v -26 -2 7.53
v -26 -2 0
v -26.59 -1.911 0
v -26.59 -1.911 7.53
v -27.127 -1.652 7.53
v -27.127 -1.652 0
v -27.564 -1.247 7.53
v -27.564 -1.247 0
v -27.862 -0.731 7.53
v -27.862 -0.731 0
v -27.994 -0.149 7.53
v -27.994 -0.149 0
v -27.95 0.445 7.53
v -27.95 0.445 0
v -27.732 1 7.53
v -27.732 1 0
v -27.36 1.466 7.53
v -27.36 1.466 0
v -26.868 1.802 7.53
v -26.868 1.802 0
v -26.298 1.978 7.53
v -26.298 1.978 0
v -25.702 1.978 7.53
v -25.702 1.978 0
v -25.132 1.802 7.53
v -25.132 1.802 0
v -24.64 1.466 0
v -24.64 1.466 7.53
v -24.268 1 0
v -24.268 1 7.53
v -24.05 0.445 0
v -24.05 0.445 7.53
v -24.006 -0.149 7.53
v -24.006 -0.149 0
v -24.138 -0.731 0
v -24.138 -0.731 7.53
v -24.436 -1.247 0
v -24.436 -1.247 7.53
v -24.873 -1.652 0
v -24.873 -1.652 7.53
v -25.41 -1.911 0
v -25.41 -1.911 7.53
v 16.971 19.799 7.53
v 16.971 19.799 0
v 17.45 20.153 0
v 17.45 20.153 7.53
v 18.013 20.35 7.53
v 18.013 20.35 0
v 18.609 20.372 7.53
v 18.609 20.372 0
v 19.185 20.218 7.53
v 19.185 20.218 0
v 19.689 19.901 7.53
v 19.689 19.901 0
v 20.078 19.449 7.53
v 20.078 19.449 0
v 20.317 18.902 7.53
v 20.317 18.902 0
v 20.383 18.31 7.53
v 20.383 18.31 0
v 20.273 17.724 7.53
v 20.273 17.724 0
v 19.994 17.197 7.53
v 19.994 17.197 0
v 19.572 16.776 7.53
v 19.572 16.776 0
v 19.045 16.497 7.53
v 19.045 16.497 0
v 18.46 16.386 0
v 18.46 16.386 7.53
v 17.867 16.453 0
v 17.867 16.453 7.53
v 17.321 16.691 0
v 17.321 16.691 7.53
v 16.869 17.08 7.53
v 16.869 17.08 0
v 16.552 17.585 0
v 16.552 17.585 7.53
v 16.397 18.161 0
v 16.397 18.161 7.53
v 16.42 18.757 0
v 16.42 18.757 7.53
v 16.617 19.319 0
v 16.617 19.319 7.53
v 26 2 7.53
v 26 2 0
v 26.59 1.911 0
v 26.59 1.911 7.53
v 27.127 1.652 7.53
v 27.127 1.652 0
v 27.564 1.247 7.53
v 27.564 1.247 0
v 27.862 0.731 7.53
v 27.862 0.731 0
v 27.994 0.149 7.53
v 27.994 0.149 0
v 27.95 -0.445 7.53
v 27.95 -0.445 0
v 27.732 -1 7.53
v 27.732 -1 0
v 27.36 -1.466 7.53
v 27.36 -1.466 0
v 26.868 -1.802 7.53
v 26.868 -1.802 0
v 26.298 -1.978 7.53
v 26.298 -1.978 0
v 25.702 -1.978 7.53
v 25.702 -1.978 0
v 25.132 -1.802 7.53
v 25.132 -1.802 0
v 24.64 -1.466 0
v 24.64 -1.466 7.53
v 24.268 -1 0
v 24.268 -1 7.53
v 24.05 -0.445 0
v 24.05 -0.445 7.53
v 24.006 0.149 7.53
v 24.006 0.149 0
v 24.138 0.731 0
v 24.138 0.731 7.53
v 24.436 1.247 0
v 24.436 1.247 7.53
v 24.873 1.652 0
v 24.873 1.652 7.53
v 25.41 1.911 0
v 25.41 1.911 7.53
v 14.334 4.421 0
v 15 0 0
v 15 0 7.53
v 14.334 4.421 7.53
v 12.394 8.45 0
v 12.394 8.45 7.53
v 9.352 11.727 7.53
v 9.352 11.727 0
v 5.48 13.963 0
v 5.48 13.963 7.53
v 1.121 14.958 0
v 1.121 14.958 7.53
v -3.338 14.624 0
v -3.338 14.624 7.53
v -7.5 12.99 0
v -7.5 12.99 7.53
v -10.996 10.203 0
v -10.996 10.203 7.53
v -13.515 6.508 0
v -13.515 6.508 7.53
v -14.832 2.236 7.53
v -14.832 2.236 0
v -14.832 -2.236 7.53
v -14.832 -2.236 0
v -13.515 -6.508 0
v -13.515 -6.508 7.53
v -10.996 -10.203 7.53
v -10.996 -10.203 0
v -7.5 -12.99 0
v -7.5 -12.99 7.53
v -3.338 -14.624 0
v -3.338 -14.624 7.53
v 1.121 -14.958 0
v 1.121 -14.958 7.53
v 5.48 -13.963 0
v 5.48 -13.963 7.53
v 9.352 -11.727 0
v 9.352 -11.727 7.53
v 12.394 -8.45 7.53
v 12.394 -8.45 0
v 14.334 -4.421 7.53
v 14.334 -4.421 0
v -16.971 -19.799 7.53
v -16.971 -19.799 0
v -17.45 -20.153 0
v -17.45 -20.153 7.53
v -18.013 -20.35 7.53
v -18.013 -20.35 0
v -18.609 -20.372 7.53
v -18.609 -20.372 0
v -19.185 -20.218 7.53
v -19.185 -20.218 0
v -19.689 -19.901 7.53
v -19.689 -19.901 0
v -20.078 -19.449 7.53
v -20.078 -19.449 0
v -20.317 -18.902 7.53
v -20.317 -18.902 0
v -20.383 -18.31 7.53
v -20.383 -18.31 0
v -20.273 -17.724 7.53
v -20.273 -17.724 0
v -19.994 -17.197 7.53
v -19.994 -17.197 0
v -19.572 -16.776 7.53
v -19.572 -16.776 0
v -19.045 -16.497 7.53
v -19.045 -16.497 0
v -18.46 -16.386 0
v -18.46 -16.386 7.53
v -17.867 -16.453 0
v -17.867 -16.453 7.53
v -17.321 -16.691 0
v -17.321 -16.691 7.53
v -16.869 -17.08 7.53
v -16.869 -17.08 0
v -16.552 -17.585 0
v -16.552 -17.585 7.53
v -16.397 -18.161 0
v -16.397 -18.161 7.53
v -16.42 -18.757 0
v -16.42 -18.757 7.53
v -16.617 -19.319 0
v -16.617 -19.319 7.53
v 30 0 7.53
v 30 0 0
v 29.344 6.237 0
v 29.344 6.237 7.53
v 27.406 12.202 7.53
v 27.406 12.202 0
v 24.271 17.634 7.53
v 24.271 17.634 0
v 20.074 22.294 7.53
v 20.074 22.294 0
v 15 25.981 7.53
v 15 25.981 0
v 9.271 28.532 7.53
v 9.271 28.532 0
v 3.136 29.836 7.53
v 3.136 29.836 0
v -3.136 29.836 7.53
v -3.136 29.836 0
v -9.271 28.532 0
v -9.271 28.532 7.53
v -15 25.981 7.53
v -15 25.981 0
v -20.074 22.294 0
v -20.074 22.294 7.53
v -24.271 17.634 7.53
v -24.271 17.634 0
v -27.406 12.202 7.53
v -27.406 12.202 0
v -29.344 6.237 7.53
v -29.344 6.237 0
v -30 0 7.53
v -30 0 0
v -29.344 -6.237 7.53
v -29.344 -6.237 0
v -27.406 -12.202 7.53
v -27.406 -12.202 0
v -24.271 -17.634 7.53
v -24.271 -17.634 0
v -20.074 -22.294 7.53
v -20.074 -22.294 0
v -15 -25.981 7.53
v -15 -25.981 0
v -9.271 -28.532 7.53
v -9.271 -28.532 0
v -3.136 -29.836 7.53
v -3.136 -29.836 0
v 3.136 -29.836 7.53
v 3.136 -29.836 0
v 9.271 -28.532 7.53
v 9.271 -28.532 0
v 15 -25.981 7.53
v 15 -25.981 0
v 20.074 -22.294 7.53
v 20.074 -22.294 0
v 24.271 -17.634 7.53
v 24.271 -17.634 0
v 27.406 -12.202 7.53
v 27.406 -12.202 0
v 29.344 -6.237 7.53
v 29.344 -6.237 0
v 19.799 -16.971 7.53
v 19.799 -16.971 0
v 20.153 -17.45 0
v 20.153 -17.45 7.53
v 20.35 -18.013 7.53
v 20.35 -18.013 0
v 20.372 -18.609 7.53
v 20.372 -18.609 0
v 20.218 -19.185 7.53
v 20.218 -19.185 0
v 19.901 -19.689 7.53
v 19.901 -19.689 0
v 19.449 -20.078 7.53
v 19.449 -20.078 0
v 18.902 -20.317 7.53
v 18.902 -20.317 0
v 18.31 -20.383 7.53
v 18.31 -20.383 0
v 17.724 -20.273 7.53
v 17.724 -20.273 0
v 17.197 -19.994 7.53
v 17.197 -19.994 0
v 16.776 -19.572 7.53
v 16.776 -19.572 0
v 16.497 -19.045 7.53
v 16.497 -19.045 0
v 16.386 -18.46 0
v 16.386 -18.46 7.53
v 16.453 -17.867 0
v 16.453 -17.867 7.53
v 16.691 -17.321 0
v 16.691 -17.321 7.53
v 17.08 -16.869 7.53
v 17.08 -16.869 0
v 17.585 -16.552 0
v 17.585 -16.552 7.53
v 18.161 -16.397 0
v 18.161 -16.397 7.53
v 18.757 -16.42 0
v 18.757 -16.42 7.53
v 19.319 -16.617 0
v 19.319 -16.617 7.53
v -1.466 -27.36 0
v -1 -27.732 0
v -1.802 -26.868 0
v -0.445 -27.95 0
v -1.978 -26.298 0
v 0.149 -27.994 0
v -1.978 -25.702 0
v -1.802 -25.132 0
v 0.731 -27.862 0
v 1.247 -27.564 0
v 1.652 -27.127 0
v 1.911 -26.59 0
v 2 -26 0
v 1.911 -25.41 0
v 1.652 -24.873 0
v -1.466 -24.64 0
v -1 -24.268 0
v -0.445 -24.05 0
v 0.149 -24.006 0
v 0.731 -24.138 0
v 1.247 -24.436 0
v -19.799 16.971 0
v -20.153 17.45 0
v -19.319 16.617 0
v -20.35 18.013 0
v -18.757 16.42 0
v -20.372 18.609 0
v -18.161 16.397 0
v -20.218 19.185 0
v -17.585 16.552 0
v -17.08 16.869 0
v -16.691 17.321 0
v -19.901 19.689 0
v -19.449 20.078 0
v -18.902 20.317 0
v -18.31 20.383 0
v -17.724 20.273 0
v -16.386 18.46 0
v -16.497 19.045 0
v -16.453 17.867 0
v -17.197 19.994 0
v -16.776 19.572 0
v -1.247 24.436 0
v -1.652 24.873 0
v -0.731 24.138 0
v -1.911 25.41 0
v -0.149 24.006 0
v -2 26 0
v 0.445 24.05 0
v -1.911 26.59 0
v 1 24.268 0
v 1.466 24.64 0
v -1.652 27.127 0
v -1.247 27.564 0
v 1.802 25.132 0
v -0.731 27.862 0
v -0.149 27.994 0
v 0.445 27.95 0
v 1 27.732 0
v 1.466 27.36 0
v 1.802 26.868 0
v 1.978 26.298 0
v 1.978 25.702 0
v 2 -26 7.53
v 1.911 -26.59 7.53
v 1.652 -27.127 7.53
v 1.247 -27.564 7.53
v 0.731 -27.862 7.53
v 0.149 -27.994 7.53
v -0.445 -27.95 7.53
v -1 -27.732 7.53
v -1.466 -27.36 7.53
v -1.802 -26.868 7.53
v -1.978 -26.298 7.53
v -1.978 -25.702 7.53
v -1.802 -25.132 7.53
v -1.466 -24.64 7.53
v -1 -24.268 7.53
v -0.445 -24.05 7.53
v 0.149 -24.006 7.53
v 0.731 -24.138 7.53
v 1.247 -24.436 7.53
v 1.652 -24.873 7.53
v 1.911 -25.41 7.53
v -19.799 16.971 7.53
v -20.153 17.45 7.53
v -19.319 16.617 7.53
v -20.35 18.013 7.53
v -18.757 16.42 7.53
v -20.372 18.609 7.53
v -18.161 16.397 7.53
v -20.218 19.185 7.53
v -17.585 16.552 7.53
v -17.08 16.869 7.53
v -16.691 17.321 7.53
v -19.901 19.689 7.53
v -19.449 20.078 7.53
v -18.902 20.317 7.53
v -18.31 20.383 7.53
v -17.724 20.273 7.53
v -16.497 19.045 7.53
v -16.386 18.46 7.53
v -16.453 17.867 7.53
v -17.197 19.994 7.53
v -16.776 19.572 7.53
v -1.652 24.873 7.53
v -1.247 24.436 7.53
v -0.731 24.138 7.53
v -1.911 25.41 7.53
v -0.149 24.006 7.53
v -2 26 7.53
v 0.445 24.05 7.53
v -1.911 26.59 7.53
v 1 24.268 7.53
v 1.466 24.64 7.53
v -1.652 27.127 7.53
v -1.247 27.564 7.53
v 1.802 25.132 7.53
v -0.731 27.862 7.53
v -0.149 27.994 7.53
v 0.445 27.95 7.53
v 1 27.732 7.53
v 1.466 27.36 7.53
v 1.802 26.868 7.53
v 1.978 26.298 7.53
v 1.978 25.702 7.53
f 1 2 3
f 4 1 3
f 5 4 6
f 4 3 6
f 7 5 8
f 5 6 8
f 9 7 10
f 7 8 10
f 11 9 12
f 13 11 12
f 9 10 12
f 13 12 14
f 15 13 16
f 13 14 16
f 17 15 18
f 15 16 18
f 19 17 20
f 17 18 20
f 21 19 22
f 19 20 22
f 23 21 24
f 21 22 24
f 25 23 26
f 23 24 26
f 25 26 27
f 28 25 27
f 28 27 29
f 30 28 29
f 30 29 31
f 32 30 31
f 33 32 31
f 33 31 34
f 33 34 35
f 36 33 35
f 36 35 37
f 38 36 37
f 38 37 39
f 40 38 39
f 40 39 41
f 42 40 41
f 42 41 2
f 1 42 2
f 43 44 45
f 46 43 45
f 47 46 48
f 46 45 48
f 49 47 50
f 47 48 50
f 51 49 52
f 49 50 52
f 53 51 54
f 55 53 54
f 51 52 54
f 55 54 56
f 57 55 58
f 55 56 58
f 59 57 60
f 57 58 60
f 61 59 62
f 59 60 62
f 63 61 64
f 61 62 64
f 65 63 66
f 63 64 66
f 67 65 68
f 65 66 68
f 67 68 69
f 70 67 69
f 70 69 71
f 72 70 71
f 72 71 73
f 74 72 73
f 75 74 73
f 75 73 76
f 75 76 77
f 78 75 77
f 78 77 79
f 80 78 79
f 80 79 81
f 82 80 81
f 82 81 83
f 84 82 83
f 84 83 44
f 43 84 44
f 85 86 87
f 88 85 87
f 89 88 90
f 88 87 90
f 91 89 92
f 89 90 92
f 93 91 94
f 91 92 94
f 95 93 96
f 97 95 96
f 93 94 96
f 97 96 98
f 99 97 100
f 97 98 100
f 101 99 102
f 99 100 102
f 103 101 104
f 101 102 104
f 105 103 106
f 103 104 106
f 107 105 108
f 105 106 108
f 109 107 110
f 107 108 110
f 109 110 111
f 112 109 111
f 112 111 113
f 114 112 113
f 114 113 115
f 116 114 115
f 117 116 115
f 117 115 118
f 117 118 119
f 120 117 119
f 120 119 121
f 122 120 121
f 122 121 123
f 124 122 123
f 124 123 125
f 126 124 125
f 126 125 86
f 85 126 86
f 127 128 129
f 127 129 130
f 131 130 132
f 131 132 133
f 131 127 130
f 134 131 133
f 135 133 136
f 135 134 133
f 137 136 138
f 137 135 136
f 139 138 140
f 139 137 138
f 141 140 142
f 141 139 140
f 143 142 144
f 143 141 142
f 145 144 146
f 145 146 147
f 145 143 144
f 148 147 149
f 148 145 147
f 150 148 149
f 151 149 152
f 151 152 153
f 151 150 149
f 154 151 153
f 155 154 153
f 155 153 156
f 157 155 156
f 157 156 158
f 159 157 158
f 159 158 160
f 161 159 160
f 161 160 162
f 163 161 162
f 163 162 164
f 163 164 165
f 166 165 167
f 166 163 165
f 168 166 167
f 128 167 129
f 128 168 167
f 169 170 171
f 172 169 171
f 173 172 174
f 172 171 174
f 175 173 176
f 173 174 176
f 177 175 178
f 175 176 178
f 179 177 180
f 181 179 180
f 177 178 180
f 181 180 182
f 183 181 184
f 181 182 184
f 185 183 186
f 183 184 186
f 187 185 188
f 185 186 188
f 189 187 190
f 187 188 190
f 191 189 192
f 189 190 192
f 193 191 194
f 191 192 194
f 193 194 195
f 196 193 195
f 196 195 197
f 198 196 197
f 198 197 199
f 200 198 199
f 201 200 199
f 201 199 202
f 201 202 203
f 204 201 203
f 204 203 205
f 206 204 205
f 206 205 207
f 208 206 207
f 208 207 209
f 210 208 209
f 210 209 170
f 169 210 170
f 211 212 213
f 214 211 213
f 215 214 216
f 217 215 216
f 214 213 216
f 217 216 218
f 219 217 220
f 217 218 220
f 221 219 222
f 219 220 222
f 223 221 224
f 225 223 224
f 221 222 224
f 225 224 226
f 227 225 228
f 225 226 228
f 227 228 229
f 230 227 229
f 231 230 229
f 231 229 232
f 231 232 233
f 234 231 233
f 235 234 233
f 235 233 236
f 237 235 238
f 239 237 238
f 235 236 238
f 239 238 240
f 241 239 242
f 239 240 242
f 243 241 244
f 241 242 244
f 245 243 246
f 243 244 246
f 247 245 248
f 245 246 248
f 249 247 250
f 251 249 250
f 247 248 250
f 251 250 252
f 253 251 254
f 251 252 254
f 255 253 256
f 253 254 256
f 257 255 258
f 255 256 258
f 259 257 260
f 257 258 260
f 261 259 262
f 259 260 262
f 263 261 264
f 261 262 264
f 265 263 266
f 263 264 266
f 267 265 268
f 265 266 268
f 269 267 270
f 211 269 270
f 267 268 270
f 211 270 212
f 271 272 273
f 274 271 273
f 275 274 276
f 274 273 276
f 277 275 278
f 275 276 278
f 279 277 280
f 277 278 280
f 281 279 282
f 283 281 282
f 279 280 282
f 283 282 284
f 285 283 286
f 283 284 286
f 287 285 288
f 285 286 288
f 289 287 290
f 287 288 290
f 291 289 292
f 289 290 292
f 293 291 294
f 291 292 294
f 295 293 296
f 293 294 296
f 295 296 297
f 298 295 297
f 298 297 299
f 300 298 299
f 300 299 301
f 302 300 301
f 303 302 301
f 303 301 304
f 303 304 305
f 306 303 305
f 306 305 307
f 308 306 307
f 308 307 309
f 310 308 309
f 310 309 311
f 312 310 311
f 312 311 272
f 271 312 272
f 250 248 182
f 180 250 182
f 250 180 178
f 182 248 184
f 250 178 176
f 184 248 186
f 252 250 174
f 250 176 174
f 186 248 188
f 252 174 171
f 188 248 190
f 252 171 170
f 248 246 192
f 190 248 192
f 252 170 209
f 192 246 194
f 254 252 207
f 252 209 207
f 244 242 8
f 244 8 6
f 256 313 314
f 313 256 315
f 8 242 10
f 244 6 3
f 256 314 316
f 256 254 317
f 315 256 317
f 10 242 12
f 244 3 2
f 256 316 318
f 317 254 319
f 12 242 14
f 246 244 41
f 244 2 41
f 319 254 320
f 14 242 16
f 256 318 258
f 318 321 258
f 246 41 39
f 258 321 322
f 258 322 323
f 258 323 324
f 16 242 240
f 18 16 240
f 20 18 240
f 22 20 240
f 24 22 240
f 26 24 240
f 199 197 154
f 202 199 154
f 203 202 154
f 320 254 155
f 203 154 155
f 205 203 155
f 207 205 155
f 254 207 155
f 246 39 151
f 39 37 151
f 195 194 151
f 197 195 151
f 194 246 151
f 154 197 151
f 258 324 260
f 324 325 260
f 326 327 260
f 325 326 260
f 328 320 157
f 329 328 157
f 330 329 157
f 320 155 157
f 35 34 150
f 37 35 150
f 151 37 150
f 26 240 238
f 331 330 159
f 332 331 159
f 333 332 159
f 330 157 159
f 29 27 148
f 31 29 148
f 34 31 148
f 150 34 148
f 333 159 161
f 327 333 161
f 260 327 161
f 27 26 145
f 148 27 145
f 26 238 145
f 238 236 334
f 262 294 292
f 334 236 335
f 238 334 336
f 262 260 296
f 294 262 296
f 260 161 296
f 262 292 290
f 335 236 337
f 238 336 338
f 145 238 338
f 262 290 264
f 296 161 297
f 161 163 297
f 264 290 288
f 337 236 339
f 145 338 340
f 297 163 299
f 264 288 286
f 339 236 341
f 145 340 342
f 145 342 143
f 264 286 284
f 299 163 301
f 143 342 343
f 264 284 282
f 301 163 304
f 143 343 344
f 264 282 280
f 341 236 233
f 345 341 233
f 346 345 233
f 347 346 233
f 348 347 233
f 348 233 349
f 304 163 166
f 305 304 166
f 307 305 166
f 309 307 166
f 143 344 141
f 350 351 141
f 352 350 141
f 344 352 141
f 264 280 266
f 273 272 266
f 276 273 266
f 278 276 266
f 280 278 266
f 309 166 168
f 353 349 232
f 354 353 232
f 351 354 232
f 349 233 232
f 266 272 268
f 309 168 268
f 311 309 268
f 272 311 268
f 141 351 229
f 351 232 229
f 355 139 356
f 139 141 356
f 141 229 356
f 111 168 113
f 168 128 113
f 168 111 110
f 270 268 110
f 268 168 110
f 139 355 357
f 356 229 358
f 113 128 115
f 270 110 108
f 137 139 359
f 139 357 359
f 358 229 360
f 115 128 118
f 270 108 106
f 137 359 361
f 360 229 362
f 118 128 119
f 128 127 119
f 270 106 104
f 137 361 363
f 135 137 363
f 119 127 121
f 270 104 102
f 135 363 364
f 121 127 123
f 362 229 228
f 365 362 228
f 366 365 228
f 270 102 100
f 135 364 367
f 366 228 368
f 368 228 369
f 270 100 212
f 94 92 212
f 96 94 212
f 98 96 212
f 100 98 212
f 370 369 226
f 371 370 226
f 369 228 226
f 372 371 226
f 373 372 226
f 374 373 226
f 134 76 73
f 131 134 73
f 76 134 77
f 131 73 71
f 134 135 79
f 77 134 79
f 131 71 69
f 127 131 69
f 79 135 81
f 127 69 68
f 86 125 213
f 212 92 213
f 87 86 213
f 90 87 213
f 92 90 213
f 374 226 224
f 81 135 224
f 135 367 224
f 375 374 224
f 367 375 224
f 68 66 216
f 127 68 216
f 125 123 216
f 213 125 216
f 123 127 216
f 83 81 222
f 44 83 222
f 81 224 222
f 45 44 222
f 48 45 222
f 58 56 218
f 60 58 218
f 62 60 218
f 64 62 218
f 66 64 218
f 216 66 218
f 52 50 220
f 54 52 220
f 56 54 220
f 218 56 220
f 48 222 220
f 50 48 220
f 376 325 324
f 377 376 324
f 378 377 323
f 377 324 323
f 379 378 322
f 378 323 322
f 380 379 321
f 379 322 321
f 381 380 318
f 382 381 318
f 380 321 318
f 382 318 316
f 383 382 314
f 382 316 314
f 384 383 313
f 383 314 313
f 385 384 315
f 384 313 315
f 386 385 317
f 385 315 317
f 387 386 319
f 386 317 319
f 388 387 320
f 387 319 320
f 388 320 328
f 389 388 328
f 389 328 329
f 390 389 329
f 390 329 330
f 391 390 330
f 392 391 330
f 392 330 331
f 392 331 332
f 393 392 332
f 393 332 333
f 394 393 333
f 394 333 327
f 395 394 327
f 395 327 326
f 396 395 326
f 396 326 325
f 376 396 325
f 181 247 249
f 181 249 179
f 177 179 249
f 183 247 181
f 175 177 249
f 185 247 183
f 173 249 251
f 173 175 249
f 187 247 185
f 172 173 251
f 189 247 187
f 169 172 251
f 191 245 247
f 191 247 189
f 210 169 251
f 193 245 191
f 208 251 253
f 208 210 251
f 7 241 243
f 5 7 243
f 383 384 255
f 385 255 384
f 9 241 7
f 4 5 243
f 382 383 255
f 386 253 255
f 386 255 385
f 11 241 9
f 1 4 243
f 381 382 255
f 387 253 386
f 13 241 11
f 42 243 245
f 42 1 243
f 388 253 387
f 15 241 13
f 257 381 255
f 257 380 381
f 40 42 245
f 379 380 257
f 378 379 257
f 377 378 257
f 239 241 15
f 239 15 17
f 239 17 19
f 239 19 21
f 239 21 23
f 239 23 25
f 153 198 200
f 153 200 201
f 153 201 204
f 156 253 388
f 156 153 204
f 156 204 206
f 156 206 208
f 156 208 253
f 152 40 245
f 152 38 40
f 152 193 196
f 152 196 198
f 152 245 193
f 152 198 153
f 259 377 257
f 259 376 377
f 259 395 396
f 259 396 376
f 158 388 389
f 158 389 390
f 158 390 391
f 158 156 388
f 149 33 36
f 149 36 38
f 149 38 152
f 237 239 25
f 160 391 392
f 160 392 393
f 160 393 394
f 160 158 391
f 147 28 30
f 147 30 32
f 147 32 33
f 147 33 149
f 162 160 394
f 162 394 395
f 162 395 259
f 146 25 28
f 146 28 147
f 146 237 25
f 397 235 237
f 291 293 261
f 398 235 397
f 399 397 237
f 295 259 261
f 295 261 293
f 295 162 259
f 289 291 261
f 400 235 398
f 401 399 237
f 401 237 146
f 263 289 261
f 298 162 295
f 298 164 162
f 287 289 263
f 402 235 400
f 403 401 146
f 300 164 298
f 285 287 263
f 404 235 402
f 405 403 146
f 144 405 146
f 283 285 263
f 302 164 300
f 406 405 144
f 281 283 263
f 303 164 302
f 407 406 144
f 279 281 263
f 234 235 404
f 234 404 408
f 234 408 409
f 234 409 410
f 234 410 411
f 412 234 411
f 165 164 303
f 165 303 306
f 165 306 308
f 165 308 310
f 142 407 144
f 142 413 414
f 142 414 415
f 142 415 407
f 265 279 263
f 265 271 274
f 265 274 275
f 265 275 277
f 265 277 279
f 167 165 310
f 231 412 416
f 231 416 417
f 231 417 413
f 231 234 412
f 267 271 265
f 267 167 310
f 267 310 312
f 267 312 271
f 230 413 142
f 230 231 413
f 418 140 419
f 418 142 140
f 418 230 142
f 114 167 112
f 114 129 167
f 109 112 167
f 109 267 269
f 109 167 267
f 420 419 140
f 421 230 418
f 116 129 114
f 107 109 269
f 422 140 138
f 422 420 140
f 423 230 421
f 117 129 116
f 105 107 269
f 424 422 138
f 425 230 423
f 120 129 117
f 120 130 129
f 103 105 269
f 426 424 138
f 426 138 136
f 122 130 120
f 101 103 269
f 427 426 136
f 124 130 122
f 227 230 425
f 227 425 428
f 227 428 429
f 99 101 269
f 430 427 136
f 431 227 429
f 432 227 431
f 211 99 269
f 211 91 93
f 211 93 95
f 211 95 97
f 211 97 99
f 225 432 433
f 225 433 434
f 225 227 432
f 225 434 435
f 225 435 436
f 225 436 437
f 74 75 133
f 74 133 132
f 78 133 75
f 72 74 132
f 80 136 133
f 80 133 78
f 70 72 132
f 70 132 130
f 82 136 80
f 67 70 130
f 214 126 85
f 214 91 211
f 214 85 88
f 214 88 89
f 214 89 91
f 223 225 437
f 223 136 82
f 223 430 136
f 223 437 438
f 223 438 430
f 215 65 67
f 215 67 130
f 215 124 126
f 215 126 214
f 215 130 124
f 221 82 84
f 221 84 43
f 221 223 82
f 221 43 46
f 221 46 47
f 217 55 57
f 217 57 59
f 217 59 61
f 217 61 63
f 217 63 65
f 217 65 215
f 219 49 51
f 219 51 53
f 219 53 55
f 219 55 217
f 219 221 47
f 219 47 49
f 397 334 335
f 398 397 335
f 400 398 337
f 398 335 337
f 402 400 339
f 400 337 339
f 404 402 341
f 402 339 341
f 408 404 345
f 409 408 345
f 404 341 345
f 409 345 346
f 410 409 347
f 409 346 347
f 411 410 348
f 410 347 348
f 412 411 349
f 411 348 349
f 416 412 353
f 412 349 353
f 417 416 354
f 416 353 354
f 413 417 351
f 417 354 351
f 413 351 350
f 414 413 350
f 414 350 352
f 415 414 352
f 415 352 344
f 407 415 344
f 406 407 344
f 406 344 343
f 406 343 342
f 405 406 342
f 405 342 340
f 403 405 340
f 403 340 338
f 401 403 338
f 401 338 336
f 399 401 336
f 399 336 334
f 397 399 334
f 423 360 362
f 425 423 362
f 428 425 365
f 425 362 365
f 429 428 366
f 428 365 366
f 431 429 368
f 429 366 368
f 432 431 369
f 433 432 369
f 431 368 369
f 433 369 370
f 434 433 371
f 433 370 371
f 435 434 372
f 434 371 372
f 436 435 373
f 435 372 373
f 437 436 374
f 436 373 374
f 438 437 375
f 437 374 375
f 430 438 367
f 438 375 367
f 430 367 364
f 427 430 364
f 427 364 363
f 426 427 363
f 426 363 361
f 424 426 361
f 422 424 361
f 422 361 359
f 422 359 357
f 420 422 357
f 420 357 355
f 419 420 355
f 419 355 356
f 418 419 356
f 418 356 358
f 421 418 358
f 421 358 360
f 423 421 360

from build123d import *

# Parameters (mm, degrees)
SKETCH1_R             = 30
SKETCH1_R_2           = 15
BOSS_EXTRUDE1_DEPTH   = 7.53
F_1_0MM_DOWEL_HOLE1_D = 4
CIRPATTERN1_COUNT     = 8


with BuildPart() as part:
    # Sketch1 → Boss-Extrude1 (new body)
    with BuildSketch(Plane.XY):
        Circle(SKETCH1_R)
        Circle(SKETCH1_R_2, mode=Mode.SUBTRACT)
    extrude(amount=BOSS_EXTRUDE1_DEPTH)

    # Ø1.0mm Dowel Hole1 (through all)
    with Locations(Plane.XY.offset(7.53)):
        with Locations((0, 26)):
            f_1_0mm_dowel_hole1 = Hole(F_1_0MM_DOWEL_HOLE1_D / 2)

    # CirPattern1: Ø1.0mm Dowel Hole1 ×8 about axis
    cirpattern1_axis = Axis((0, 0, 0), (0, 0, 1))
    for i in range(1, CIRPATTERN1_COUNT):
        add(f_1_0mm_dowel_hole1.rotate(cirpattern1_axis, i * 360 / CIRPATTERN1_COUNT), mode=Mode.SUBTRACT)


solid = part.part
